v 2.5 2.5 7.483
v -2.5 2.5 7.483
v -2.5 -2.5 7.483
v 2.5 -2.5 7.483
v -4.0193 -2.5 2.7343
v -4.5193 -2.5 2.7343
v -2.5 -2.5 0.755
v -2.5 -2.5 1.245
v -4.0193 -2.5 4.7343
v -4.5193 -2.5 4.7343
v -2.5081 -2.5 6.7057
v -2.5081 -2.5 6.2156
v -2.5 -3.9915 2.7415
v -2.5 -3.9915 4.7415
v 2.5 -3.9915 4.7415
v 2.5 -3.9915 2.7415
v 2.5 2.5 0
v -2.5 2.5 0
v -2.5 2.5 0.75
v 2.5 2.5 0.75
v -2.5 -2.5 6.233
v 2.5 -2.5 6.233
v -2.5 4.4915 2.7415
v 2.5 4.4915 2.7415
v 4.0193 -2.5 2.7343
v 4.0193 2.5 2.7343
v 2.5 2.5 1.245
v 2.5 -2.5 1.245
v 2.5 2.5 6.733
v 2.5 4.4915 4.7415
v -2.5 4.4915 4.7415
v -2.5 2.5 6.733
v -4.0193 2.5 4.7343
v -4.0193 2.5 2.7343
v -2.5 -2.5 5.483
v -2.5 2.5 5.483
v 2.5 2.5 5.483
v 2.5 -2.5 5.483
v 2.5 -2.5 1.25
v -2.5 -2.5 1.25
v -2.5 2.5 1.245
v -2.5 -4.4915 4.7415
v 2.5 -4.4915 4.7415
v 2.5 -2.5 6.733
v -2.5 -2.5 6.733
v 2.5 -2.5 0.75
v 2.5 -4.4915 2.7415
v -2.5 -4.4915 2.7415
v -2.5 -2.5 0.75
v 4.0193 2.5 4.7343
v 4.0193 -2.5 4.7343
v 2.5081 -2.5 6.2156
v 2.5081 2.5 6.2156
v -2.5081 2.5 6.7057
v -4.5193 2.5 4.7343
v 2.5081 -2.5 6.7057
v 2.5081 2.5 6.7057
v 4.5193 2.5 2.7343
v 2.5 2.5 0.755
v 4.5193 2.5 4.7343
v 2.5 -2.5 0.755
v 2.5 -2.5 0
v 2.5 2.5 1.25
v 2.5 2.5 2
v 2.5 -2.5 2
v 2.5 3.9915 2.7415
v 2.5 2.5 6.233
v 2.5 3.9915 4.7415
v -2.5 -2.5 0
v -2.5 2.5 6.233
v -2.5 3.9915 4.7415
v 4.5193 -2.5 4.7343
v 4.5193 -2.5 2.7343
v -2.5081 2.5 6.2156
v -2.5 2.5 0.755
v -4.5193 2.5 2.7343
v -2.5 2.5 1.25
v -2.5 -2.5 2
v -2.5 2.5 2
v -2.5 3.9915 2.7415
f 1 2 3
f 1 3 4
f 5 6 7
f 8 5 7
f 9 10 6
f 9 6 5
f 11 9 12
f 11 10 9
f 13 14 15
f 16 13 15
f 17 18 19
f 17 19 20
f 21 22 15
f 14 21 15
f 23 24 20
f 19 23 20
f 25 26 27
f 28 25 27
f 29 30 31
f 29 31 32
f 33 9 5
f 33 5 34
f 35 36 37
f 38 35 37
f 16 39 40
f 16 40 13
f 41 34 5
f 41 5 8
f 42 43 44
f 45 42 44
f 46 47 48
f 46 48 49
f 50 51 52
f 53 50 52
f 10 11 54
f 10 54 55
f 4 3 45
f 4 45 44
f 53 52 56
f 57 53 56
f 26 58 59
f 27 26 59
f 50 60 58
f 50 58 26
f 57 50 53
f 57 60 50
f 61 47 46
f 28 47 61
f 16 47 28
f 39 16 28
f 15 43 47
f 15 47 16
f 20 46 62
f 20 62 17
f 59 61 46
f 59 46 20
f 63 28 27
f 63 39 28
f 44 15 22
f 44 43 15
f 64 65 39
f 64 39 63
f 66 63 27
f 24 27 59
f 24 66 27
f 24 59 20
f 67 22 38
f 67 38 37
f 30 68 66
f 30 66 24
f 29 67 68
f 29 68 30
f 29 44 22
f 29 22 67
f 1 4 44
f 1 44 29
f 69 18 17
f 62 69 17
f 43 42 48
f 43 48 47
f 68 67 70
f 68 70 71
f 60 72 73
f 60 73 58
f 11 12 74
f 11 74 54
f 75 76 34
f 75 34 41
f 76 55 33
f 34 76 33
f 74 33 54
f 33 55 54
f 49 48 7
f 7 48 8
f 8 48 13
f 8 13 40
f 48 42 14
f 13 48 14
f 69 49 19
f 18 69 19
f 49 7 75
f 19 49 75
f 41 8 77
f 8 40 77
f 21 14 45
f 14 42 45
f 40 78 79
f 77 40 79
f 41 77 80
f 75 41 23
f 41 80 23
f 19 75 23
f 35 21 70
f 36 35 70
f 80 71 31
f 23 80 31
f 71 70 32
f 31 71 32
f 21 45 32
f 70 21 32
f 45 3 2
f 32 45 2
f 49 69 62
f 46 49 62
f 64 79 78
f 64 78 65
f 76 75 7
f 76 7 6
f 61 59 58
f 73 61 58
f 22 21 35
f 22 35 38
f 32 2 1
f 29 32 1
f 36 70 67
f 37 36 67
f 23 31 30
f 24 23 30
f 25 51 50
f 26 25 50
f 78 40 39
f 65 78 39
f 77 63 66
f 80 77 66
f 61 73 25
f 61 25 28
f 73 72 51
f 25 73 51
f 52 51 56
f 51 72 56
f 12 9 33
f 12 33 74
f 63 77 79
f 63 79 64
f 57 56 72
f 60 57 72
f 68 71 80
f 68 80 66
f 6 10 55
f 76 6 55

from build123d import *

# Parameters (mm, degrees)
SKETCH2_W                = 5
SKETCH2_H                = 5
BOSS_EXTRUDE1_DEPTH      = 2
BOSS_EXTRUDE3_DEPTH      = 5
BOSS_EXTRUDE4_DEPTH      = 5
SKETCH12_W               = 5
SKETCH12_H               = 0.5
BOSS_EXTRUDE5_DEPTH      = 1
SKETCH13_W               = 0.5
SKETCH13_H               = 5
BOSS_EXTRUDE6_DEPTH      = 1
MIRROR8_COPY_1_SKETCH_W  = 5
MIRROR8_COPY_1_SKETCH_H  = 0.5
MIRROR8_COPY_1_DEPTH     = 1
MIRROR9_COPY_1_DEPTH     = 5
MIRROR14_COPY_1_SKETCH_W = 0.5
MIRROR14_COPY_1_SKETCH_H = 5
MIRROR14_COPY_1_DEPTH    = 1
BOSS_EXTRUDE7_DEPTH      = 5


with BuildPart() as part:
    # Sketch2 → Boss-Extrude1 (new body)
    with BuildSketch(Plane.XY):
        Rectangle(SKETCH2_W, SKETCH2_H)
    boss_extrude1 = extrude(amount=BOSS_EXTRUDE1_DEPTH)

    # Sketch4 → Boss-Extrude3 (add)
    with BuildSketch(Plane(origin=(2.5, 0, 0), x_dir=(0, 0, -1), z_dir=(1, 0, 0))):
        Polygon((-1.25, -2.5), (-2.741508092, -3.991508092), (-2.741508092, -4.491508092), (-0.75, -2.5), align=None)
    boss_extrude3 = extrude(amount=-BOSS_EXTRUDE3_DEPTH)

    # Sketch9 → Boss-Extrude4 (add)
    with BuildSketch(Plane(origin=(0, 2.5, 0), x_dir=(1, 0, 0), z_dir=(0, 1, 0))):
        Polygon((2.5, -0.754950985), (4.519335319, -2.734295506), (4.019335319, -2.734295506), (2.5, -1.245049015), align=None)
    boss_extrude4 = extrude(amount=-BOSS_EXTRUDE4_DEPTH)

    # Mirror2: Boss-Extrude3 across plane
    add(boss_extrude3.mirror(Plane.ZX))

    # Mirror3: Boss-Extrude4 across plane
    add(boss_extrude4.mirror(Plane(origin=(0, 0, 0), x_dir=(0, 0, 1), z_dir=(1, 0, 0))))

    # Sketch12 → Boss-Extrude5 (add)
    with BuildSketch(Plane.XY.offset(2.741508092)):
        with Locations((0, -4.241508092)):
            Rectangle(SKETCH12_W, SKETCH12_H)
    boss_extrude5 = extrude(amount=BOSS_EXTRUDE5_DEPTH)

    # Sketch13 → Boss-Extrude6 (add)
    with BuildSketch(Plane.XY.offset(2.734295506)):
        with Locations((4.269335319, 0)):
            Rectangle(SKETCH13_W, SKETCH13_H)
    boss_extrude6 = extrude(amount=BOSS_EXTRUDE6_DEPTH)

    # Mirror4: Boss-Extrude5 across plane
    add(boss_extrude5.mirror(Plane.ZX))

    # Mirror5: Boss-Extrude6 across plane
    add(boss_extrude6.mirror(Plane(origin=(0, 0, 0), x_dir=(0, 0, 1), z_dir=(1, 0, 0))))

    # Mirror8: Boss-Extrude5 across plane
    add(boss_extrude5.mirror(Plane.XY.offset(3.741508092)))

    # Mirror8 copy 1 sketch → Mirror8 copy 1 (add)
    with BuildSketch(Plane(origin=(0, 0, 4.741508092), x_dir=(1, 0, 0), z_dir=(0, 0, -1))):
        with Locations((0, -4.241508092)):
            Rectangle(MIRROR8_COPY_1_SKETCH_W, MIRROR8_COPY_1_SKETCH_H)
    extrude(amount=MIRROR8_COPY_1_DEPTH)

    # Mirror9: Boss-Extrude3 across plane
    add(boss_extrude3.mirror(Plane.XY.offset(3.741508092)))

    # Mirror9 copy 1 sketch → Mirror9 copy 1 (add)
    with BuildSketch(Plane(origin=(2.5, 0, 7.483016184), x_dir=(0, 0, 1), z_dir=(1, 0, 0))):
        Polygon((-1.25, -2.5), (-2.741508092, -3.991508092), (-2.741508092, -4.491508092), (-0.75, -2.5), align=None)
    extrude(amount=-MIRROR9_COPY_1_DEPTH)

    # Mirror14: Boss-Extrude6 across plane
    add(boss_extrude6.mirror(Plane.XY.offset(3.734295506)))

    # Mirror14 copy 1 sketch → Mirror14 copy 1 (add)
    with BuildSketch(Plane(origin=(0, 0, 4.734295506), x_dir=(-1, 0, 0), z_dir=(0, 0, -1))):
        with Locations((4.269335319, 0)):
            Rectangle(MIRROR14_COPY_1_SKETCH_W, MIRROR14_COPY_1_SKETCH_H)
    extrude(amount=MIRROR14_COPY_1_DEPTH)

    # Sketch14 → Boss-Extrude7 (add)
    with BuildSketch(Plane.XZ.offset(2.5)):
        Polygon((4.519335319, 4.734295506), (4.019335319, 4.734295506), (2.508072629, 6.215629239), (2.508072629, 6.705727268), align=None)
    boss_extrude7 = extrude(amount=-BOSS_EXTRUDE7_DEPTH)

    # Mirror15: Boss-Extrude7 across plane
    add(boss_extrude7.mirror(Plane(origin=(0, 0, 0), x_dir=(0, 0, 1), z_dir=(1, 0, 0))))

    # Mirror16: Boss-Extrude1 across plane
    add(boss_extrude1.mirror(Plane.XY.offset(3.741508092)))


solid = part.part
